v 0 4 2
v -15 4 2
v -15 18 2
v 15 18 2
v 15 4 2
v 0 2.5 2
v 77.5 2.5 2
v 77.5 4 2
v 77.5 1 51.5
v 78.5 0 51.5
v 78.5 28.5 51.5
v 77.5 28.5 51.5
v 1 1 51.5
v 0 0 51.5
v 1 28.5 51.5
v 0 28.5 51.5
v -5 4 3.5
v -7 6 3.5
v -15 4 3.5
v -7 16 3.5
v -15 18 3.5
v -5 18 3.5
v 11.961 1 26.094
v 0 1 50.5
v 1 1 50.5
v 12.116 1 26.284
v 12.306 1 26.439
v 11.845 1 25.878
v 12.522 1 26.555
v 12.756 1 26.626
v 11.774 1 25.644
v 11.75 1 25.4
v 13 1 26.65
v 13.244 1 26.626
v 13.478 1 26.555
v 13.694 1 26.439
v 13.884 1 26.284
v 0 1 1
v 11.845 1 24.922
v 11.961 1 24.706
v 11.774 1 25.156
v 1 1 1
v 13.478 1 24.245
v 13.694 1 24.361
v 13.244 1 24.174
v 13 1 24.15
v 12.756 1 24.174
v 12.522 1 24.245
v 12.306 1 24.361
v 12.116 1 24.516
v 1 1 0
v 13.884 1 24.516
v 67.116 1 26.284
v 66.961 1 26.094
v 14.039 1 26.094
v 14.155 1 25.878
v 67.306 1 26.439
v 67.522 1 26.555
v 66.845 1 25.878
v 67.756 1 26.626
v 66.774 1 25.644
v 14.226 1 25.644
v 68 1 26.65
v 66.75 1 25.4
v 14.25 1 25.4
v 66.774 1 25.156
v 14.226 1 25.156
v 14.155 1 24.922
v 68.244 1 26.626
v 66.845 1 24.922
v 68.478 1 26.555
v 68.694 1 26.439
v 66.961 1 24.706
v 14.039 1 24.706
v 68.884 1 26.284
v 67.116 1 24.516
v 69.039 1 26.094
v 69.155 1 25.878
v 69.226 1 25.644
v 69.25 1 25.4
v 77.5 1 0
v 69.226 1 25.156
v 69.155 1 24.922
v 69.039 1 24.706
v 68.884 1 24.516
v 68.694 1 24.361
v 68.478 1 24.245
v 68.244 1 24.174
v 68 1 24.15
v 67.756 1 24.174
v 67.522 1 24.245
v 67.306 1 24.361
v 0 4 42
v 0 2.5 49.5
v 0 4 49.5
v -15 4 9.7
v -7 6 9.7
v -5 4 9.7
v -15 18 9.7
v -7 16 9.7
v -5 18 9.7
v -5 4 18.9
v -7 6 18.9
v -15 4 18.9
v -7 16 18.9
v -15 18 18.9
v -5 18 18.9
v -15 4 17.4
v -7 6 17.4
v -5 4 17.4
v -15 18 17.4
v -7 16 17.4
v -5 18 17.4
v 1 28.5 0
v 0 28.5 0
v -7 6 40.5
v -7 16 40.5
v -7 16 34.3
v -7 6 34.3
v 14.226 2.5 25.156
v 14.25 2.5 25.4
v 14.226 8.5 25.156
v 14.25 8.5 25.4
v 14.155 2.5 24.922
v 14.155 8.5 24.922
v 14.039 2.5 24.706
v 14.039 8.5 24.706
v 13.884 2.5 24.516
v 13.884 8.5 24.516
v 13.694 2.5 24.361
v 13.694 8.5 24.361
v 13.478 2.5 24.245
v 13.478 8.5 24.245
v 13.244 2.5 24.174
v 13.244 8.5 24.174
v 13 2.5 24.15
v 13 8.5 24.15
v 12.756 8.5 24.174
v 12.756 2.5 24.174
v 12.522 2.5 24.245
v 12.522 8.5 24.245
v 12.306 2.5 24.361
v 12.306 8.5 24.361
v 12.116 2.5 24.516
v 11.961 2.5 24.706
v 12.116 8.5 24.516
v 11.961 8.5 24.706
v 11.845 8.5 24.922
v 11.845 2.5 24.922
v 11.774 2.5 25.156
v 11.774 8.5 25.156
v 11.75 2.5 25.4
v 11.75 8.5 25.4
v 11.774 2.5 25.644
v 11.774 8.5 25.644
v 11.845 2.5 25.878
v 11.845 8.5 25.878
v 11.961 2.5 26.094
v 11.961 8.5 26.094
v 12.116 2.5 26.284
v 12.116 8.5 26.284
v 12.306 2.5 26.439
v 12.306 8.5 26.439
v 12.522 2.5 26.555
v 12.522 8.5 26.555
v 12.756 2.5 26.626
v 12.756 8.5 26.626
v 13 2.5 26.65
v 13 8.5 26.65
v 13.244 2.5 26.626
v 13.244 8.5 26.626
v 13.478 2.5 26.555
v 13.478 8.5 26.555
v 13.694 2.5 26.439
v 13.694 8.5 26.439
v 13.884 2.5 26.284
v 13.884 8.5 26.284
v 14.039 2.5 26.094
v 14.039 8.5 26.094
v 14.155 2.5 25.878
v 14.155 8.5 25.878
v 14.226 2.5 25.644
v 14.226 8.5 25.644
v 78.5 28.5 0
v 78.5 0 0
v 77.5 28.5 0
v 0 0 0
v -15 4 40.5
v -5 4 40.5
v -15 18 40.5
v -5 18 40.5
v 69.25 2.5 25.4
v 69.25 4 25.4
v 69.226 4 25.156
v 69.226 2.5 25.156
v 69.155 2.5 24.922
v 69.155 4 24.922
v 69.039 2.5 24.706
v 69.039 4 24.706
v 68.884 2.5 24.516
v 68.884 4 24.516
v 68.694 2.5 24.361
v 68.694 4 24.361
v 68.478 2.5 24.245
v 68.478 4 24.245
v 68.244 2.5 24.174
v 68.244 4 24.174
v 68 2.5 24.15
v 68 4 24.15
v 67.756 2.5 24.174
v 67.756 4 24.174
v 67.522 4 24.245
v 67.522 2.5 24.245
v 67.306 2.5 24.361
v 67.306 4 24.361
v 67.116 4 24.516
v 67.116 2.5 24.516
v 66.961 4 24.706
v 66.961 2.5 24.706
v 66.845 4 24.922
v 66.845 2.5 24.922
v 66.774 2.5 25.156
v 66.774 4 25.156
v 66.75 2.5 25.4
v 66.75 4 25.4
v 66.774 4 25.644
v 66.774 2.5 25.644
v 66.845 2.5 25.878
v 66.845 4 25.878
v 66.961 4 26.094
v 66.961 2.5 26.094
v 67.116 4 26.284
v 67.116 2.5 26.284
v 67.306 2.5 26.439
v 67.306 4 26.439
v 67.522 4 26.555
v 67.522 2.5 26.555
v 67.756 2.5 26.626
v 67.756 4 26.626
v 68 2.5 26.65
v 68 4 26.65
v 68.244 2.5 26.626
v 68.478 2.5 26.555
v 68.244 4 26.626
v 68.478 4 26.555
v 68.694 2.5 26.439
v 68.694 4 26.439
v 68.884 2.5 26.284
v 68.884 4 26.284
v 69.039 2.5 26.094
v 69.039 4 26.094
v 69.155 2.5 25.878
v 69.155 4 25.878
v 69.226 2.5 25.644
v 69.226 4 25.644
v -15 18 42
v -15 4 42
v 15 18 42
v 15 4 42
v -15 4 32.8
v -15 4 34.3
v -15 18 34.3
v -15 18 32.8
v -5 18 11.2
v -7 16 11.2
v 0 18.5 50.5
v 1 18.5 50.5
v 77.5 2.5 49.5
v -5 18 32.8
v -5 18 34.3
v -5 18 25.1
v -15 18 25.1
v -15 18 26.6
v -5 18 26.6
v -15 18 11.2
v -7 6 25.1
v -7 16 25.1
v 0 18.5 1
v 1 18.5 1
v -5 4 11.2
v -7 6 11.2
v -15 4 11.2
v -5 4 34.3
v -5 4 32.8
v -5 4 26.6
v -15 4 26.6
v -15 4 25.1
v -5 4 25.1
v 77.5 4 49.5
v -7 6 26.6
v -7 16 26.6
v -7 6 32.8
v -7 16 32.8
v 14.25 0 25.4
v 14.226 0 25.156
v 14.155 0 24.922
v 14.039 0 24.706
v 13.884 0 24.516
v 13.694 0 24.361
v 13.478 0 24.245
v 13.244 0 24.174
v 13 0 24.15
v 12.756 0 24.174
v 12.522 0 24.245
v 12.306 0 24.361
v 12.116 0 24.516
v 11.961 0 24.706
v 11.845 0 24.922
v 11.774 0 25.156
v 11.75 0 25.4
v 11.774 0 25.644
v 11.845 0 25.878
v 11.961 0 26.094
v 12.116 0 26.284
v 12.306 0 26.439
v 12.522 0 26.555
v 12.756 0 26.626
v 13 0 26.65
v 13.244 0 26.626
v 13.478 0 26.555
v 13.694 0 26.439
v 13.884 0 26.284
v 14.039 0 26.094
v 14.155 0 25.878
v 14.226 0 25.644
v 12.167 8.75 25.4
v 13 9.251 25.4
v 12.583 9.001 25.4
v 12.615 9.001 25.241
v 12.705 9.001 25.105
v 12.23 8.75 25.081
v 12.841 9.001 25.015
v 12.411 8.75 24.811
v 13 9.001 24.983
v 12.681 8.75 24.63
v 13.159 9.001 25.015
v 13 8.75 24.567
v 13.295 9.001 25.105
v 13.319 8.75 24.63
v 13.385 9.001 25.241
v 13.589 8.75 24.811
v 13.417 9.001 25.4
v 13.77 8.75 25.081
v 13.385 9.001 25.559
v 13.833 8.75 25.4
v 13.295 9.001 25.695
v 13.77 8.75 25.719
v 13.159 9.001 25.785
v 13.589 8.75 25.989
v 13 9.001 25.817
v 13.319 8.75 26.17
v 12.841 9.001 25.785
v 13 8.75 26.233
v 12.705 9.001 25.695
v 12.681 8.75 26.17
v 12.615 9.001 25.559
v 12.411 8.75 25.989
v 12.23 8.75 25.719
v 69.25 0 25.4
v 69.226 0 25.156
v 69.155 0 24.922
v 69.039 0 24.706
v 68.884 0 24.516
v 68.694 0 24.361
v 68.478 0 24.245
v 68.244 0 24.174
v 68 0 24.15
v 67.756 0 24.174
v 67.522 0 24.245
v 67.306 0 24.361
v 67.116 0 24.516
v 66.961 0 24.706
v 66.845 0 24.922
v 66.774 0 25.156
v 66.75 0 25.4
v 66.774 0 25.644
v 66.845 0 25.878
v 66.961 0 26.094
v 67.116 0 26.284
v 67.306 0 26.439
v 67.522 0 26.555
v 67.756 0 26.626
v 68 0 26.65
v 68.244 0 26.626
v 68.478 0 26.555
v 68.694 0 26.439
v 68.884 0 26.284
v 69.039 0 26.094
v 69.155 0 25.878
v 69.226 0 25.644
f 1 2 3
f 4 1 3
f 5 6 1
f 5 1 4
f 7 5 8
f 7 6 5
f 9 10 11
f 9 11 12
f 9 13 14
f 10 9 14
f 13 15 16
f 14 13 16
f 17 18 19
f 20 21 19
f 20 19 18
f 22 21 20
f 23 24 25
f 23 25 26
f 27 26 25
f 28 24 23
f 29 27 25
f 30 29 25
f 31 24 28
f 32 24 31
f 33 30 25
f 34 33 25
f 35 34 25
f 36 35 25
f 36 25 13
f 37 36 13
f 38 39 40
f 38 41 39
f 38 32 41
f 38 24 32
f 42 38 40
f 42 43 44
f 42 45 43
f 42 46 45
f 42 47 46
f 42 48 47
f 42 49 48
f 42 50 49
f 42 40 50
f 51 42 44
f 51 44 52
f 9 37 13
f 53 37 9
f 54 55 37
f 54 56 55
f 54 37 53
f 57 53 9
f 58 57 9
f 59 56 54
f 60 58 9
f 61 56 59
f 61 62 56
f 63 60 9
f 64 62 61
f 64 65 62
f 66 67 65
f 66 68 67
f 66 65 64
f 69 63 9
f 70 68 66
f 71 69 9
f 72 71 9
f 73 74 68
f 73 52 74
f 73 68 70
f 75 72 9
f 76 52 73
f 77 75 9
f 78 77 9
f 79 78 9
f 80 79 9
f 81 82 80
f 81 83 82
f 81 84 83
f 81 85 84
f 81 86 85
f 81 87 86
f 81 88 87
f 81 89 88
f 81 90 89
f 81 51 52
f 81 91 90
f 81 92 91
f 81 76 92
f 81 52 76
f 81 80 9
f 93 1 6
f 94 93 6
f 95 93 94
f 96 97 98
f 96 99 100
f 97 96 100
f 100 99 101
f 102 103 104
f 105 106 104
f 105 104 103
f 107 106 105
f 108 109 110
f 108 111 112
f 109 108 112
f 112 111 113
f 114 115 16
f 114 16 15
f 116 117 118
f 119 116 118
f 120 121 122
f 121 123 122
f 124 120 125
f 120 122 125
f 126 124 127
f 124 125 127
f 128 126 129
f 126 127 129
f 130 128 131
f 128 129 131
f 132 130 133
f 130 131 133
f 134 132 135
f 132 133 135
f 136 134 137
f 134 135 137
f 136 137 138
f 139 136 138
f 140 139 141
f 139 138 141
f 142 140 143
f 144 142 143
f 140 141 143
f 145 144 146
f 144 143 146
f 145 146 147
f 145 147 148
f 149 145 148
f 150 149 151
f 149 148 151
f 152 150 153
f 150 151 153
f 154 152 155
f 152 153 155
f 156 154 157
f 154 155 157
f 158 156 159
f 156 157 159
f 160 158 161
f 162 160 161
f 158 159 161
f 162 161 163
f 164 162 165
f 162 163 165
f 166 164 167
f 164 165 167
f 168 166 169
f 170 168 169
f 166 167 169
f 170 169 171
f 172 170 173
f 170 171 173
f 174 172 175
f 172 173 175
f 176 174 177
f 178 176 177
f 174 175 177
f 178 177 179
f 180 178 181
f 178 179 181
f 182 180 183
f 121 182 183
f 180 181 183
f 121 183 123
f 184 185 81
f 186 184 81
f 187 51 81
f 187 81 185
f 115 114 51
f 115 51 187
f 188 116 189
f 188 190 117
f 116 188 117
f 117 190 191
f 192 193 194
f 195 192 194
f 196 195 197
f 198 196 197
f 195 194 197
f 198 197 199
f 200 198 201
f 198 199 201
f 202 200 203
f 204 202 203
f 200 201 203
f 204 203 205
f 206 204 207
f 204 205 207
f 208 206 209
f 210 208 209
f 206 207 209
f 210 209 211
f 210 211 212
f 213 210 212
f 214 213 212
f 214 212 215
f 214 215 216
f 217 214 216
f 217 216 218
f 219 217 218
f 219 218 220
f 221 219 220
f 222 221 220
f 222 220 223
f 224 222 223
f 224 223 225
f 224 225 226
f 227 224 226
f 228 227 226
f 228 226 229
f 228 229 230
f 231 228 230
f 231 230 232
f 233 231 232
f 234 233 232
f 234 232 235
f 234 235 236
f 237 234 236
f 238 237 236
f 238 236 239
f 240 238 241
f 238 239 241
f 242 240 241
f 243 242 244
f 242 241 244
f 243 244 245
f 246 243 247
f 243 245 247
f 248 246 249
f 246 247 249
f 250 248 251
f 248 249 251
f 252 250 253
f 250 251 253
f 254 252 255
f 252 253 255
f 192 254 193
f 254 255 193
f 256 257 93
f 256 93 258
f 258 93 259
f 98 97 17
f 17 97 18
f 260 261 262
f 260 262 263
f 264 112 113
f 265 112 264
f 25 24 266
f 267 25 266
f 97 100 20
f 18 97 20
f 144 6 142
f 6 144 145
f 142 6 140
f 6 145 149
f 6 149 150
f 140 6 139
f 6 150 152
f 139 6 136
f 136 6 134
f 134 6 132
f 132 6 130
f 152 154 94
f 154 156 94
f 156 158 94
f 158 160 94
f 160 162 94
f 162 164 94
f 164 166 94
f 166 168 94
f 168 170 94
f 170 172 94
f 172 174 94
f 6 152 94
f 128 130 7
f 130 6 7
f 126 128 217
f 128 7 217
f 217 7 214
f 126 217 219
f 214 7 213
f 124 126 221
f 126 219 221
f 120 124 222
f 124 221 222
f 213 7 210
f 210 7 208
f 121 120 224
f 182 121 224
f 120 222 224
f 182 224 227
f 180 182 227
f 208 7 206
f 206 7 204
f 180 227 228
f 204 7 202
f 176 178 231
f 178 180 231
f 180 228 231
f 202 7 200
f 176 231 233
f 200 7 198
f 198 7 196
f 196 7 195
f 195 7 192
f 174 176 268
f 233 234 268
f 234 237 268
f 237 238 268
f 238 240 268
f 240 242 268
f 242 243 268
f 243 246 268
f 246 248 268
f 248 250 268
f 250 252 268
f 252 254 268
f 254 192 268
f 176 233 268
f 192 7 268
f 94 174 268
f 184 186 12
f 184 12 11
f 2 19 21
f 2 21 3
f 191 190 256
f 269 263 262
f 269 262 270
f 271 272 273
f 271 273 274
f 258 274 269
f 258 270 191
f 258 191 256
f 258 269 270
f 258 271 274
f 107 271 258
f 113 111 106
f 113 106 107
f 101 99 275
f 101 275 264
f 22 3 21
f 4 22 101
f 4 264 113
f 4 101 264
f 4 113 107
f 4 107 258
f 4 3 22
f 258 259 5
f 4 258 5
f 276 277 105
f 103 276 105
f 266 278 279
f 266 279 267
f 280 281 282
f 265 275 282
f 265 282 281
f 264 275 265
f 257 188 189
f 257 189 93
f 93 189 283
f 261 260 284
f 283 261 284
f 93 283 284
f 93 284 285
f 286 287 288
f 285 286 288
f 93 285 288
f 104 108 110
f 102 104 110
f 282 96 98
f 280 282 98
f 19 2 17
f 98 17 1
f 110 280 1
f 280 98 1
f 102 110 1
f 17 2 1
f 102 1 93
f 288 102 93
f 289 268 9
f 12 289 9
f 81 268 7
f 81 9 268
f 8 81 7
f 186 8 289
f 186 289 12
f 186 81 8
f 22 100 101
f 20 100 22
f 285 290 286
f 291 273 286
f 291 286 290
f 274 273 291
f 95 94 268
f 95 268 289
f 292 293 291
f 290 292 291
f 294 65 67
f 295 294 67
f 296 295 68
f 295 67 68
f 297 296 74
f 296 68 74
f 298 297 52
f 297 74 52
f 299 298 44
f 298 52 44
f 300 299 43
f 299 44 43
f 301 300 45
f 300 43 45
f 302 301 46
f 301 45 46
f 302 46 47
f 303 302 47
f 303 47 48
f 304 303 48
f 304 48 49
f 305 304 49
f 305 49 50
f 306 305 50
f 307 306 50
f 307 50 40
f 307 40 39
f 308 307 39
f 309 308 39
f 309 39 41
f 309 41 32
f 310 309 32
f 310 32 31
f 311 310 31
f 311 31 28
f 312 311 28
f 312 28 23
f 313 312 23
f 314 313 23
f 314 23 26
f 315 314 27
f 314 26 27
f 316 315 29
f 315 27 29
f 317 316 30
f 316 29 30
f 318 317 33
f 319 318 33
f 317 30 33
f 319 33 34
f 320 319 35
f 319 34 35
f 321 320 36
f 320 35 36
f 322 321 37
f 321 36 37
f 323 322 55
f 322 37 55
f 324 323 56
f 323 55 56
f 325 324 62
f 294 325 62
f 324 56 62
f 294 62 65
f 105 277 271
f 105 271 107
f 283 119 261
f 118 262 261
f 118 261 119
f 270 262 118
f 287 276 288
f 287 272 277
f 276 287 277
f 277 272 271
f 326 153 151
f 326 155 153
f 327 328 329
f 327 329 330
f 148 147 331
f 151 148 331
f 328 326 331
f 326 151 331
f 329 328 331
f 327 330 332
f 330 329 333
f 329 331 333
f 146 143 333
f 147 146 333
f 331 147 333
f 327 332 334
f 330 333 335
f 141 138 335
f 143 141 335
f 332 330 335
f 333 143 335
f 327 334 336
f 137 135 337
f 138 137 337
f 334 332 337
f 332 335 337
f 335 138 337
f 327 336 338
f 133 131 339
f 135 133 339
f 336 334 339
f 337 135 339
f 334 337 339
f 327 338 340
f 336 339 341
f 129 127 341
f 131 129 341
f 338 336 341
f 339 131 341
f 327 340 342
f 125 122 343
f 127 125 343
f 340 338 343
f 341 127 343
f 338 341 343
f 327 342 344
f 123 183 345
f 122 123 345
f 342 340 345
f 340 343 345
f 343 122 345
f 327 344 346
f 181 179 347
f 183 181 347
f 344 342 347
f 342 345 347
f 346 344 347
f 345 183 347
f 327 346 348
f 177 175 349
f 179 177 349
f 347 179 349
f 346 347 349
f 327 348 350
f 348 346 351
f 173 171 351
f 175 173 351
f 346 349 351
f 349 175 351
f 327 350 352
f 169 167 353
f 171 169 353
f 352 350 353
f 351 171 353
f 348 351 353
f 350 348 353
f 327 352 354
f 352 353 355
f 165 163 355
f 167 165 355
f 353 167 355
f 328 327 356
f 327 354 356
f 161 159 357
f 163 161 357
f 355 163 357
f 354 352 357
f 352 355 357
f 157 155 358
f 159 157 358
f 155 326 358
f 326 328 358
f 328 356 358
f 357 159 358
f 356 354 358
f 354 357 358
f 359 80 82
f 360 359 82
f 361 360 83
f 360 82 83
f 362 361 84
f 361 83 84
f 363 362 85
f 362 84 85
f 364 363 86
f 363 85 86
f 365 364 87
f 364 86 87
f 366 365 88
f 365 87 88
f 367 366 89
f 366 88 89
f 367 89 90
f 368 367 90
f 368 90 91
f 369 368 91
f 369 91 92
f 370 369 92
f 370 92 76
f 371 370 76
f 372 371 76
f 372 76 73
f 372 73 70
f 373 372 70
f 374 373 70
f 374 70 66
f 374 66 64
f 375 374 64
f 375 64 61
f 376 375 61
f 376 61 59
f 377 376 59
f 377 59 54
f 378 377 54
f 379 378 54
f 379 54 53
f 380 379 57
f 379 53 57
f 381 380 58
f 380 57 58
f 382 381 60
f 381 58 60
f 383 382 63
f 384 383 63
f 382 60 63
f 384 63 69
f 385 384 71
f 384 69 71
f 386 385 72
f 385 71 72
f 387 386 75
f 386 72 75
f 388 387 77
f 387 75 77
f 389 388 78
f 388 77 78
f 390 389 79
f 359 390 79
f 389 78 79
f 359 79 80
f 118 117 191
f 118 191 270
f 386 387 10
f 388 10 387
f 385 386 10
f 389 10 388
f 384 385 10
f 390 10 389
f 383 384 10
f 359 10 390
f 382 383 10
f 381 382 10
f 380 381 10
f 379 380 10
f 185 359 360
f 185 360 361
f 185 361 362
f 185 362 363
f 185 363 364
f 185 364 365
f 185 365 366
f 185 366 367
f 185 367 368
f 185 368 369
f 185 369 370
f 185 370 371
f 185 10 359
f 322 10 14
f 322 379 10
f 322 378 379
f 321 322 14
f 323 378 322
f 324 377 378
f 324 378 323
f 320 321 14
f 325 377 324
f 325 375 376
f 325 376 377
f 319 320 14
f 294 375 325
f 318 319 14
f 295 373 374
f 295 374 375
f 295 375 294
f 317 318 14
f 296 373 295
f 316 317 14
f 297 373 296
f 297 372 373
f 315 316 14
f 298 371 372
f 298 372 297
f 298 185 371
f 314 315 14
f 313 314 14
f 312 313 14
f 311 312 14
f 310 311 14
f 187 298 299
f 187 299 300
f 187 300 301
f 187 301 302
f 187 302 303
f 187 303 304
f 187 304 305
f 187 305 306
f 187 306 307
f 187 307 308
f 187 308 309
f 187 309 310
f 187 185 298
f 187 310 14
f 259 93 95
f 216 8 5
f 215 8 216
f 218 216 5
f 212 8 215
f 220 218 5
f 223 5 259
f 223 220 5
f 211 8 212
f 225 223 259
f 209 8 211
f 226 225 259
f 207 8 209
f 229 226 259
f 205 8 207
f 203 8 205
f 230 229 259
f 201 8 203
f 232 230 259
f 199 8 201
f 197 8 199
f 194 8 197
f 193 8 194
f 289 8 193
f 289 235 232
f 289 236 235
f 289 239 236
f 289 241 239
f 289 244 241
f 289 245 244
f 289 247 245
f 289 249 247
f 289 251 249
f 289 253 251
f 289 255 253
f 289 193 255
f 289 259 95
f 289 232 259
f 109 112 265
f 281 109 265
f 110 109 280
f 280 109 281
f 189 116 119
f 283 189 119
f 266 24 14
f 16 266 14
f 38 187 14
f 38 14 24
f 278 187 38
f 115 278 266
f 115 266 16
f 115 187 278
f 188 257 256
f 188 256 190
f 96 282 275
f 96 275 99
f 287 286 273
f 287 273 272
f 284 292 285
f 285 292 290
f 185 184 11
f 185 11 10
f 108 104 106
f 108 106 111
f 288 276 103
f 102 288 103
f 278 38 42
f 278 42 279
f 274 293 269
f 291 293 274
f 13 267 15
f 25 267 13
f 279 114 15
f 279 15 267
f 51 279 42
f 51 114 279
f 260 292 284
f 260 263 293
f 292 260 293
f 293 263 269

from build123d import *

# Parameters (mm, degrees)
EXTRUDE_1_DEPTH       = 51.5
SKETCH_2_W            = 49.5
SKETCH_2_H            = 17.5
CUT_EXTRUDE_1_DEPTH   = 10
SKETCH_3_W            = 47.5
SKETCH_3_H            = 1.5
EXTRUDE_2_DEPTH       = 77.5
SKETCH_4_W            = 30
SKETCH_4_H            = 40
EXTRUDE_3_DEPTH       = 14
SKETCH_5_W            = 8
SKETCH_5_H            = 6.2
CUT_EXTRUDE_2_DEPTH   = 24
CHAMFER_1_SIZE        = 2
HOLE_WIZARD_M31_D     = 2.5
HOLE_WIZARD_M31_DEPTH = 8.5
HOLE_WIZARD_M31_TIP   = 0.751075774


with BuildPart() as part:
    # Эскиз1 → Бобышка-Вытянуть1 (new body)
    with BuildSketch(Plane.XY):
        Polygon((1, 1), (77.5, 1), (77.5, 28.5), (78.5, 28.5), (78.5, 0), (0, 0), (0, 28.5), (1, 28.5), align=None)
    extrude(amount=EXTRUDE_1_DEPTH)

    # Эскиз2 → Вырез-Вытянуть1 (cut)
    with BuildSketch(Plane.ZY):
        with Locations((25.75, 9.75)):
            Rectangle(SKETCH_2_W, SKETCH_2_H)
    extrude(amount=-CUT_EXTRUDE_1_DEPTH, mode=Mode.SUBTRACT)

    # Эскиз3 → Бобышка-Вытянуть2 (add)
    with BuildSketch(Plane.ZY.offset(-77.5)):
        with Locations((25.75, 3.25)):
            Rectangle(SKETCH_3_W, SKETCH_3_H)
    extrude(amount=EXTRUDE_2_DEPTH)

    # Эскиз4 → Бобышка-Вытянуть3 (add)
    with BuildSketch(Plane(origin=(0, 4, 0), x_dir=(1, 0, 0), z_dir=(0, 1, 0))):
        with Locations((0, -22)):
            Rectangle(SKETCH_4_W, SKETCH_4_H)
    extrude(amount=EXTRUDE_3_DEPTH)

    # Эскиз5 → Вырез-Вытянуть2 (cut)
    with BuildSketch(Plane(origin=(0, 18, 0), x_dir=(1, 0, 0), z_dir=(0, 1, 0))):
        with Locations((-11, -6.6)):
            Rectangle(SKETCH_5_W, SKETCH_5_H)
        with Locations((-11, -37.4)):
            Rectangle(SKETCH_5_W, SKETCH_5_H)
        with Locations((-11, -14.3)):
            Rectangle(SKETCH_5_W, SKETCH_5_H)
        with Locations((-11, -22)):
            Rectangle(SKETCH_5_W, SKETCH_5_H)
        with Locations((-11, -29.7)):
            Rectangle(SKETCH_5_W, SKETCH_5_H)
    extrude(amount=-CUT_EXTRUDE_2_DEPTH, mode=Mode.SUBTRACT)

    # Фаска1
    chamfer_1_edges = [part.edges().sort_by_distance(p)[0] for p in [
        (-7, 4, 14.3),
        (-7, 18, 14.3),
        (-7, 4, 22),
        (-7, 18, 22),
        (-7, 4, 29.7),
        (-7, 18, 29.7),
        (-7, 4, 37.4),
        (-7, 18, 37.4),
        (-7, 4, 6.6),
        (-7, 18, 6.6),
    ]]
    chamfer(chamfer_1_edges, length=CHAMFER_1_SIZE)

    # Отверстие обработанное метчиком M31
    with Locations(Plane(origin=(0, 0, 0), x_dir=(-1, 0, 0), z_dir=(0, -1, 0))):
        with Locations((-13, -25.4), (-68, -25.4)):
            Hole(HOLE_WIZARD_M31_D / 2, depth=HOLE_WIZARD_M31_DEPTH)
            with Locations((0, 0, -(HOLE_WIZARD_M31_DEPTH + HOLE_WIZARD_M31_TIP / 2))):  # 118° drill point
                Cone(0, HOLE_WIZARD_M31_D / 2, HOLE_WIZARD_M31_TIP, mode=Mode.SUBTRACT)


solid = part.part
